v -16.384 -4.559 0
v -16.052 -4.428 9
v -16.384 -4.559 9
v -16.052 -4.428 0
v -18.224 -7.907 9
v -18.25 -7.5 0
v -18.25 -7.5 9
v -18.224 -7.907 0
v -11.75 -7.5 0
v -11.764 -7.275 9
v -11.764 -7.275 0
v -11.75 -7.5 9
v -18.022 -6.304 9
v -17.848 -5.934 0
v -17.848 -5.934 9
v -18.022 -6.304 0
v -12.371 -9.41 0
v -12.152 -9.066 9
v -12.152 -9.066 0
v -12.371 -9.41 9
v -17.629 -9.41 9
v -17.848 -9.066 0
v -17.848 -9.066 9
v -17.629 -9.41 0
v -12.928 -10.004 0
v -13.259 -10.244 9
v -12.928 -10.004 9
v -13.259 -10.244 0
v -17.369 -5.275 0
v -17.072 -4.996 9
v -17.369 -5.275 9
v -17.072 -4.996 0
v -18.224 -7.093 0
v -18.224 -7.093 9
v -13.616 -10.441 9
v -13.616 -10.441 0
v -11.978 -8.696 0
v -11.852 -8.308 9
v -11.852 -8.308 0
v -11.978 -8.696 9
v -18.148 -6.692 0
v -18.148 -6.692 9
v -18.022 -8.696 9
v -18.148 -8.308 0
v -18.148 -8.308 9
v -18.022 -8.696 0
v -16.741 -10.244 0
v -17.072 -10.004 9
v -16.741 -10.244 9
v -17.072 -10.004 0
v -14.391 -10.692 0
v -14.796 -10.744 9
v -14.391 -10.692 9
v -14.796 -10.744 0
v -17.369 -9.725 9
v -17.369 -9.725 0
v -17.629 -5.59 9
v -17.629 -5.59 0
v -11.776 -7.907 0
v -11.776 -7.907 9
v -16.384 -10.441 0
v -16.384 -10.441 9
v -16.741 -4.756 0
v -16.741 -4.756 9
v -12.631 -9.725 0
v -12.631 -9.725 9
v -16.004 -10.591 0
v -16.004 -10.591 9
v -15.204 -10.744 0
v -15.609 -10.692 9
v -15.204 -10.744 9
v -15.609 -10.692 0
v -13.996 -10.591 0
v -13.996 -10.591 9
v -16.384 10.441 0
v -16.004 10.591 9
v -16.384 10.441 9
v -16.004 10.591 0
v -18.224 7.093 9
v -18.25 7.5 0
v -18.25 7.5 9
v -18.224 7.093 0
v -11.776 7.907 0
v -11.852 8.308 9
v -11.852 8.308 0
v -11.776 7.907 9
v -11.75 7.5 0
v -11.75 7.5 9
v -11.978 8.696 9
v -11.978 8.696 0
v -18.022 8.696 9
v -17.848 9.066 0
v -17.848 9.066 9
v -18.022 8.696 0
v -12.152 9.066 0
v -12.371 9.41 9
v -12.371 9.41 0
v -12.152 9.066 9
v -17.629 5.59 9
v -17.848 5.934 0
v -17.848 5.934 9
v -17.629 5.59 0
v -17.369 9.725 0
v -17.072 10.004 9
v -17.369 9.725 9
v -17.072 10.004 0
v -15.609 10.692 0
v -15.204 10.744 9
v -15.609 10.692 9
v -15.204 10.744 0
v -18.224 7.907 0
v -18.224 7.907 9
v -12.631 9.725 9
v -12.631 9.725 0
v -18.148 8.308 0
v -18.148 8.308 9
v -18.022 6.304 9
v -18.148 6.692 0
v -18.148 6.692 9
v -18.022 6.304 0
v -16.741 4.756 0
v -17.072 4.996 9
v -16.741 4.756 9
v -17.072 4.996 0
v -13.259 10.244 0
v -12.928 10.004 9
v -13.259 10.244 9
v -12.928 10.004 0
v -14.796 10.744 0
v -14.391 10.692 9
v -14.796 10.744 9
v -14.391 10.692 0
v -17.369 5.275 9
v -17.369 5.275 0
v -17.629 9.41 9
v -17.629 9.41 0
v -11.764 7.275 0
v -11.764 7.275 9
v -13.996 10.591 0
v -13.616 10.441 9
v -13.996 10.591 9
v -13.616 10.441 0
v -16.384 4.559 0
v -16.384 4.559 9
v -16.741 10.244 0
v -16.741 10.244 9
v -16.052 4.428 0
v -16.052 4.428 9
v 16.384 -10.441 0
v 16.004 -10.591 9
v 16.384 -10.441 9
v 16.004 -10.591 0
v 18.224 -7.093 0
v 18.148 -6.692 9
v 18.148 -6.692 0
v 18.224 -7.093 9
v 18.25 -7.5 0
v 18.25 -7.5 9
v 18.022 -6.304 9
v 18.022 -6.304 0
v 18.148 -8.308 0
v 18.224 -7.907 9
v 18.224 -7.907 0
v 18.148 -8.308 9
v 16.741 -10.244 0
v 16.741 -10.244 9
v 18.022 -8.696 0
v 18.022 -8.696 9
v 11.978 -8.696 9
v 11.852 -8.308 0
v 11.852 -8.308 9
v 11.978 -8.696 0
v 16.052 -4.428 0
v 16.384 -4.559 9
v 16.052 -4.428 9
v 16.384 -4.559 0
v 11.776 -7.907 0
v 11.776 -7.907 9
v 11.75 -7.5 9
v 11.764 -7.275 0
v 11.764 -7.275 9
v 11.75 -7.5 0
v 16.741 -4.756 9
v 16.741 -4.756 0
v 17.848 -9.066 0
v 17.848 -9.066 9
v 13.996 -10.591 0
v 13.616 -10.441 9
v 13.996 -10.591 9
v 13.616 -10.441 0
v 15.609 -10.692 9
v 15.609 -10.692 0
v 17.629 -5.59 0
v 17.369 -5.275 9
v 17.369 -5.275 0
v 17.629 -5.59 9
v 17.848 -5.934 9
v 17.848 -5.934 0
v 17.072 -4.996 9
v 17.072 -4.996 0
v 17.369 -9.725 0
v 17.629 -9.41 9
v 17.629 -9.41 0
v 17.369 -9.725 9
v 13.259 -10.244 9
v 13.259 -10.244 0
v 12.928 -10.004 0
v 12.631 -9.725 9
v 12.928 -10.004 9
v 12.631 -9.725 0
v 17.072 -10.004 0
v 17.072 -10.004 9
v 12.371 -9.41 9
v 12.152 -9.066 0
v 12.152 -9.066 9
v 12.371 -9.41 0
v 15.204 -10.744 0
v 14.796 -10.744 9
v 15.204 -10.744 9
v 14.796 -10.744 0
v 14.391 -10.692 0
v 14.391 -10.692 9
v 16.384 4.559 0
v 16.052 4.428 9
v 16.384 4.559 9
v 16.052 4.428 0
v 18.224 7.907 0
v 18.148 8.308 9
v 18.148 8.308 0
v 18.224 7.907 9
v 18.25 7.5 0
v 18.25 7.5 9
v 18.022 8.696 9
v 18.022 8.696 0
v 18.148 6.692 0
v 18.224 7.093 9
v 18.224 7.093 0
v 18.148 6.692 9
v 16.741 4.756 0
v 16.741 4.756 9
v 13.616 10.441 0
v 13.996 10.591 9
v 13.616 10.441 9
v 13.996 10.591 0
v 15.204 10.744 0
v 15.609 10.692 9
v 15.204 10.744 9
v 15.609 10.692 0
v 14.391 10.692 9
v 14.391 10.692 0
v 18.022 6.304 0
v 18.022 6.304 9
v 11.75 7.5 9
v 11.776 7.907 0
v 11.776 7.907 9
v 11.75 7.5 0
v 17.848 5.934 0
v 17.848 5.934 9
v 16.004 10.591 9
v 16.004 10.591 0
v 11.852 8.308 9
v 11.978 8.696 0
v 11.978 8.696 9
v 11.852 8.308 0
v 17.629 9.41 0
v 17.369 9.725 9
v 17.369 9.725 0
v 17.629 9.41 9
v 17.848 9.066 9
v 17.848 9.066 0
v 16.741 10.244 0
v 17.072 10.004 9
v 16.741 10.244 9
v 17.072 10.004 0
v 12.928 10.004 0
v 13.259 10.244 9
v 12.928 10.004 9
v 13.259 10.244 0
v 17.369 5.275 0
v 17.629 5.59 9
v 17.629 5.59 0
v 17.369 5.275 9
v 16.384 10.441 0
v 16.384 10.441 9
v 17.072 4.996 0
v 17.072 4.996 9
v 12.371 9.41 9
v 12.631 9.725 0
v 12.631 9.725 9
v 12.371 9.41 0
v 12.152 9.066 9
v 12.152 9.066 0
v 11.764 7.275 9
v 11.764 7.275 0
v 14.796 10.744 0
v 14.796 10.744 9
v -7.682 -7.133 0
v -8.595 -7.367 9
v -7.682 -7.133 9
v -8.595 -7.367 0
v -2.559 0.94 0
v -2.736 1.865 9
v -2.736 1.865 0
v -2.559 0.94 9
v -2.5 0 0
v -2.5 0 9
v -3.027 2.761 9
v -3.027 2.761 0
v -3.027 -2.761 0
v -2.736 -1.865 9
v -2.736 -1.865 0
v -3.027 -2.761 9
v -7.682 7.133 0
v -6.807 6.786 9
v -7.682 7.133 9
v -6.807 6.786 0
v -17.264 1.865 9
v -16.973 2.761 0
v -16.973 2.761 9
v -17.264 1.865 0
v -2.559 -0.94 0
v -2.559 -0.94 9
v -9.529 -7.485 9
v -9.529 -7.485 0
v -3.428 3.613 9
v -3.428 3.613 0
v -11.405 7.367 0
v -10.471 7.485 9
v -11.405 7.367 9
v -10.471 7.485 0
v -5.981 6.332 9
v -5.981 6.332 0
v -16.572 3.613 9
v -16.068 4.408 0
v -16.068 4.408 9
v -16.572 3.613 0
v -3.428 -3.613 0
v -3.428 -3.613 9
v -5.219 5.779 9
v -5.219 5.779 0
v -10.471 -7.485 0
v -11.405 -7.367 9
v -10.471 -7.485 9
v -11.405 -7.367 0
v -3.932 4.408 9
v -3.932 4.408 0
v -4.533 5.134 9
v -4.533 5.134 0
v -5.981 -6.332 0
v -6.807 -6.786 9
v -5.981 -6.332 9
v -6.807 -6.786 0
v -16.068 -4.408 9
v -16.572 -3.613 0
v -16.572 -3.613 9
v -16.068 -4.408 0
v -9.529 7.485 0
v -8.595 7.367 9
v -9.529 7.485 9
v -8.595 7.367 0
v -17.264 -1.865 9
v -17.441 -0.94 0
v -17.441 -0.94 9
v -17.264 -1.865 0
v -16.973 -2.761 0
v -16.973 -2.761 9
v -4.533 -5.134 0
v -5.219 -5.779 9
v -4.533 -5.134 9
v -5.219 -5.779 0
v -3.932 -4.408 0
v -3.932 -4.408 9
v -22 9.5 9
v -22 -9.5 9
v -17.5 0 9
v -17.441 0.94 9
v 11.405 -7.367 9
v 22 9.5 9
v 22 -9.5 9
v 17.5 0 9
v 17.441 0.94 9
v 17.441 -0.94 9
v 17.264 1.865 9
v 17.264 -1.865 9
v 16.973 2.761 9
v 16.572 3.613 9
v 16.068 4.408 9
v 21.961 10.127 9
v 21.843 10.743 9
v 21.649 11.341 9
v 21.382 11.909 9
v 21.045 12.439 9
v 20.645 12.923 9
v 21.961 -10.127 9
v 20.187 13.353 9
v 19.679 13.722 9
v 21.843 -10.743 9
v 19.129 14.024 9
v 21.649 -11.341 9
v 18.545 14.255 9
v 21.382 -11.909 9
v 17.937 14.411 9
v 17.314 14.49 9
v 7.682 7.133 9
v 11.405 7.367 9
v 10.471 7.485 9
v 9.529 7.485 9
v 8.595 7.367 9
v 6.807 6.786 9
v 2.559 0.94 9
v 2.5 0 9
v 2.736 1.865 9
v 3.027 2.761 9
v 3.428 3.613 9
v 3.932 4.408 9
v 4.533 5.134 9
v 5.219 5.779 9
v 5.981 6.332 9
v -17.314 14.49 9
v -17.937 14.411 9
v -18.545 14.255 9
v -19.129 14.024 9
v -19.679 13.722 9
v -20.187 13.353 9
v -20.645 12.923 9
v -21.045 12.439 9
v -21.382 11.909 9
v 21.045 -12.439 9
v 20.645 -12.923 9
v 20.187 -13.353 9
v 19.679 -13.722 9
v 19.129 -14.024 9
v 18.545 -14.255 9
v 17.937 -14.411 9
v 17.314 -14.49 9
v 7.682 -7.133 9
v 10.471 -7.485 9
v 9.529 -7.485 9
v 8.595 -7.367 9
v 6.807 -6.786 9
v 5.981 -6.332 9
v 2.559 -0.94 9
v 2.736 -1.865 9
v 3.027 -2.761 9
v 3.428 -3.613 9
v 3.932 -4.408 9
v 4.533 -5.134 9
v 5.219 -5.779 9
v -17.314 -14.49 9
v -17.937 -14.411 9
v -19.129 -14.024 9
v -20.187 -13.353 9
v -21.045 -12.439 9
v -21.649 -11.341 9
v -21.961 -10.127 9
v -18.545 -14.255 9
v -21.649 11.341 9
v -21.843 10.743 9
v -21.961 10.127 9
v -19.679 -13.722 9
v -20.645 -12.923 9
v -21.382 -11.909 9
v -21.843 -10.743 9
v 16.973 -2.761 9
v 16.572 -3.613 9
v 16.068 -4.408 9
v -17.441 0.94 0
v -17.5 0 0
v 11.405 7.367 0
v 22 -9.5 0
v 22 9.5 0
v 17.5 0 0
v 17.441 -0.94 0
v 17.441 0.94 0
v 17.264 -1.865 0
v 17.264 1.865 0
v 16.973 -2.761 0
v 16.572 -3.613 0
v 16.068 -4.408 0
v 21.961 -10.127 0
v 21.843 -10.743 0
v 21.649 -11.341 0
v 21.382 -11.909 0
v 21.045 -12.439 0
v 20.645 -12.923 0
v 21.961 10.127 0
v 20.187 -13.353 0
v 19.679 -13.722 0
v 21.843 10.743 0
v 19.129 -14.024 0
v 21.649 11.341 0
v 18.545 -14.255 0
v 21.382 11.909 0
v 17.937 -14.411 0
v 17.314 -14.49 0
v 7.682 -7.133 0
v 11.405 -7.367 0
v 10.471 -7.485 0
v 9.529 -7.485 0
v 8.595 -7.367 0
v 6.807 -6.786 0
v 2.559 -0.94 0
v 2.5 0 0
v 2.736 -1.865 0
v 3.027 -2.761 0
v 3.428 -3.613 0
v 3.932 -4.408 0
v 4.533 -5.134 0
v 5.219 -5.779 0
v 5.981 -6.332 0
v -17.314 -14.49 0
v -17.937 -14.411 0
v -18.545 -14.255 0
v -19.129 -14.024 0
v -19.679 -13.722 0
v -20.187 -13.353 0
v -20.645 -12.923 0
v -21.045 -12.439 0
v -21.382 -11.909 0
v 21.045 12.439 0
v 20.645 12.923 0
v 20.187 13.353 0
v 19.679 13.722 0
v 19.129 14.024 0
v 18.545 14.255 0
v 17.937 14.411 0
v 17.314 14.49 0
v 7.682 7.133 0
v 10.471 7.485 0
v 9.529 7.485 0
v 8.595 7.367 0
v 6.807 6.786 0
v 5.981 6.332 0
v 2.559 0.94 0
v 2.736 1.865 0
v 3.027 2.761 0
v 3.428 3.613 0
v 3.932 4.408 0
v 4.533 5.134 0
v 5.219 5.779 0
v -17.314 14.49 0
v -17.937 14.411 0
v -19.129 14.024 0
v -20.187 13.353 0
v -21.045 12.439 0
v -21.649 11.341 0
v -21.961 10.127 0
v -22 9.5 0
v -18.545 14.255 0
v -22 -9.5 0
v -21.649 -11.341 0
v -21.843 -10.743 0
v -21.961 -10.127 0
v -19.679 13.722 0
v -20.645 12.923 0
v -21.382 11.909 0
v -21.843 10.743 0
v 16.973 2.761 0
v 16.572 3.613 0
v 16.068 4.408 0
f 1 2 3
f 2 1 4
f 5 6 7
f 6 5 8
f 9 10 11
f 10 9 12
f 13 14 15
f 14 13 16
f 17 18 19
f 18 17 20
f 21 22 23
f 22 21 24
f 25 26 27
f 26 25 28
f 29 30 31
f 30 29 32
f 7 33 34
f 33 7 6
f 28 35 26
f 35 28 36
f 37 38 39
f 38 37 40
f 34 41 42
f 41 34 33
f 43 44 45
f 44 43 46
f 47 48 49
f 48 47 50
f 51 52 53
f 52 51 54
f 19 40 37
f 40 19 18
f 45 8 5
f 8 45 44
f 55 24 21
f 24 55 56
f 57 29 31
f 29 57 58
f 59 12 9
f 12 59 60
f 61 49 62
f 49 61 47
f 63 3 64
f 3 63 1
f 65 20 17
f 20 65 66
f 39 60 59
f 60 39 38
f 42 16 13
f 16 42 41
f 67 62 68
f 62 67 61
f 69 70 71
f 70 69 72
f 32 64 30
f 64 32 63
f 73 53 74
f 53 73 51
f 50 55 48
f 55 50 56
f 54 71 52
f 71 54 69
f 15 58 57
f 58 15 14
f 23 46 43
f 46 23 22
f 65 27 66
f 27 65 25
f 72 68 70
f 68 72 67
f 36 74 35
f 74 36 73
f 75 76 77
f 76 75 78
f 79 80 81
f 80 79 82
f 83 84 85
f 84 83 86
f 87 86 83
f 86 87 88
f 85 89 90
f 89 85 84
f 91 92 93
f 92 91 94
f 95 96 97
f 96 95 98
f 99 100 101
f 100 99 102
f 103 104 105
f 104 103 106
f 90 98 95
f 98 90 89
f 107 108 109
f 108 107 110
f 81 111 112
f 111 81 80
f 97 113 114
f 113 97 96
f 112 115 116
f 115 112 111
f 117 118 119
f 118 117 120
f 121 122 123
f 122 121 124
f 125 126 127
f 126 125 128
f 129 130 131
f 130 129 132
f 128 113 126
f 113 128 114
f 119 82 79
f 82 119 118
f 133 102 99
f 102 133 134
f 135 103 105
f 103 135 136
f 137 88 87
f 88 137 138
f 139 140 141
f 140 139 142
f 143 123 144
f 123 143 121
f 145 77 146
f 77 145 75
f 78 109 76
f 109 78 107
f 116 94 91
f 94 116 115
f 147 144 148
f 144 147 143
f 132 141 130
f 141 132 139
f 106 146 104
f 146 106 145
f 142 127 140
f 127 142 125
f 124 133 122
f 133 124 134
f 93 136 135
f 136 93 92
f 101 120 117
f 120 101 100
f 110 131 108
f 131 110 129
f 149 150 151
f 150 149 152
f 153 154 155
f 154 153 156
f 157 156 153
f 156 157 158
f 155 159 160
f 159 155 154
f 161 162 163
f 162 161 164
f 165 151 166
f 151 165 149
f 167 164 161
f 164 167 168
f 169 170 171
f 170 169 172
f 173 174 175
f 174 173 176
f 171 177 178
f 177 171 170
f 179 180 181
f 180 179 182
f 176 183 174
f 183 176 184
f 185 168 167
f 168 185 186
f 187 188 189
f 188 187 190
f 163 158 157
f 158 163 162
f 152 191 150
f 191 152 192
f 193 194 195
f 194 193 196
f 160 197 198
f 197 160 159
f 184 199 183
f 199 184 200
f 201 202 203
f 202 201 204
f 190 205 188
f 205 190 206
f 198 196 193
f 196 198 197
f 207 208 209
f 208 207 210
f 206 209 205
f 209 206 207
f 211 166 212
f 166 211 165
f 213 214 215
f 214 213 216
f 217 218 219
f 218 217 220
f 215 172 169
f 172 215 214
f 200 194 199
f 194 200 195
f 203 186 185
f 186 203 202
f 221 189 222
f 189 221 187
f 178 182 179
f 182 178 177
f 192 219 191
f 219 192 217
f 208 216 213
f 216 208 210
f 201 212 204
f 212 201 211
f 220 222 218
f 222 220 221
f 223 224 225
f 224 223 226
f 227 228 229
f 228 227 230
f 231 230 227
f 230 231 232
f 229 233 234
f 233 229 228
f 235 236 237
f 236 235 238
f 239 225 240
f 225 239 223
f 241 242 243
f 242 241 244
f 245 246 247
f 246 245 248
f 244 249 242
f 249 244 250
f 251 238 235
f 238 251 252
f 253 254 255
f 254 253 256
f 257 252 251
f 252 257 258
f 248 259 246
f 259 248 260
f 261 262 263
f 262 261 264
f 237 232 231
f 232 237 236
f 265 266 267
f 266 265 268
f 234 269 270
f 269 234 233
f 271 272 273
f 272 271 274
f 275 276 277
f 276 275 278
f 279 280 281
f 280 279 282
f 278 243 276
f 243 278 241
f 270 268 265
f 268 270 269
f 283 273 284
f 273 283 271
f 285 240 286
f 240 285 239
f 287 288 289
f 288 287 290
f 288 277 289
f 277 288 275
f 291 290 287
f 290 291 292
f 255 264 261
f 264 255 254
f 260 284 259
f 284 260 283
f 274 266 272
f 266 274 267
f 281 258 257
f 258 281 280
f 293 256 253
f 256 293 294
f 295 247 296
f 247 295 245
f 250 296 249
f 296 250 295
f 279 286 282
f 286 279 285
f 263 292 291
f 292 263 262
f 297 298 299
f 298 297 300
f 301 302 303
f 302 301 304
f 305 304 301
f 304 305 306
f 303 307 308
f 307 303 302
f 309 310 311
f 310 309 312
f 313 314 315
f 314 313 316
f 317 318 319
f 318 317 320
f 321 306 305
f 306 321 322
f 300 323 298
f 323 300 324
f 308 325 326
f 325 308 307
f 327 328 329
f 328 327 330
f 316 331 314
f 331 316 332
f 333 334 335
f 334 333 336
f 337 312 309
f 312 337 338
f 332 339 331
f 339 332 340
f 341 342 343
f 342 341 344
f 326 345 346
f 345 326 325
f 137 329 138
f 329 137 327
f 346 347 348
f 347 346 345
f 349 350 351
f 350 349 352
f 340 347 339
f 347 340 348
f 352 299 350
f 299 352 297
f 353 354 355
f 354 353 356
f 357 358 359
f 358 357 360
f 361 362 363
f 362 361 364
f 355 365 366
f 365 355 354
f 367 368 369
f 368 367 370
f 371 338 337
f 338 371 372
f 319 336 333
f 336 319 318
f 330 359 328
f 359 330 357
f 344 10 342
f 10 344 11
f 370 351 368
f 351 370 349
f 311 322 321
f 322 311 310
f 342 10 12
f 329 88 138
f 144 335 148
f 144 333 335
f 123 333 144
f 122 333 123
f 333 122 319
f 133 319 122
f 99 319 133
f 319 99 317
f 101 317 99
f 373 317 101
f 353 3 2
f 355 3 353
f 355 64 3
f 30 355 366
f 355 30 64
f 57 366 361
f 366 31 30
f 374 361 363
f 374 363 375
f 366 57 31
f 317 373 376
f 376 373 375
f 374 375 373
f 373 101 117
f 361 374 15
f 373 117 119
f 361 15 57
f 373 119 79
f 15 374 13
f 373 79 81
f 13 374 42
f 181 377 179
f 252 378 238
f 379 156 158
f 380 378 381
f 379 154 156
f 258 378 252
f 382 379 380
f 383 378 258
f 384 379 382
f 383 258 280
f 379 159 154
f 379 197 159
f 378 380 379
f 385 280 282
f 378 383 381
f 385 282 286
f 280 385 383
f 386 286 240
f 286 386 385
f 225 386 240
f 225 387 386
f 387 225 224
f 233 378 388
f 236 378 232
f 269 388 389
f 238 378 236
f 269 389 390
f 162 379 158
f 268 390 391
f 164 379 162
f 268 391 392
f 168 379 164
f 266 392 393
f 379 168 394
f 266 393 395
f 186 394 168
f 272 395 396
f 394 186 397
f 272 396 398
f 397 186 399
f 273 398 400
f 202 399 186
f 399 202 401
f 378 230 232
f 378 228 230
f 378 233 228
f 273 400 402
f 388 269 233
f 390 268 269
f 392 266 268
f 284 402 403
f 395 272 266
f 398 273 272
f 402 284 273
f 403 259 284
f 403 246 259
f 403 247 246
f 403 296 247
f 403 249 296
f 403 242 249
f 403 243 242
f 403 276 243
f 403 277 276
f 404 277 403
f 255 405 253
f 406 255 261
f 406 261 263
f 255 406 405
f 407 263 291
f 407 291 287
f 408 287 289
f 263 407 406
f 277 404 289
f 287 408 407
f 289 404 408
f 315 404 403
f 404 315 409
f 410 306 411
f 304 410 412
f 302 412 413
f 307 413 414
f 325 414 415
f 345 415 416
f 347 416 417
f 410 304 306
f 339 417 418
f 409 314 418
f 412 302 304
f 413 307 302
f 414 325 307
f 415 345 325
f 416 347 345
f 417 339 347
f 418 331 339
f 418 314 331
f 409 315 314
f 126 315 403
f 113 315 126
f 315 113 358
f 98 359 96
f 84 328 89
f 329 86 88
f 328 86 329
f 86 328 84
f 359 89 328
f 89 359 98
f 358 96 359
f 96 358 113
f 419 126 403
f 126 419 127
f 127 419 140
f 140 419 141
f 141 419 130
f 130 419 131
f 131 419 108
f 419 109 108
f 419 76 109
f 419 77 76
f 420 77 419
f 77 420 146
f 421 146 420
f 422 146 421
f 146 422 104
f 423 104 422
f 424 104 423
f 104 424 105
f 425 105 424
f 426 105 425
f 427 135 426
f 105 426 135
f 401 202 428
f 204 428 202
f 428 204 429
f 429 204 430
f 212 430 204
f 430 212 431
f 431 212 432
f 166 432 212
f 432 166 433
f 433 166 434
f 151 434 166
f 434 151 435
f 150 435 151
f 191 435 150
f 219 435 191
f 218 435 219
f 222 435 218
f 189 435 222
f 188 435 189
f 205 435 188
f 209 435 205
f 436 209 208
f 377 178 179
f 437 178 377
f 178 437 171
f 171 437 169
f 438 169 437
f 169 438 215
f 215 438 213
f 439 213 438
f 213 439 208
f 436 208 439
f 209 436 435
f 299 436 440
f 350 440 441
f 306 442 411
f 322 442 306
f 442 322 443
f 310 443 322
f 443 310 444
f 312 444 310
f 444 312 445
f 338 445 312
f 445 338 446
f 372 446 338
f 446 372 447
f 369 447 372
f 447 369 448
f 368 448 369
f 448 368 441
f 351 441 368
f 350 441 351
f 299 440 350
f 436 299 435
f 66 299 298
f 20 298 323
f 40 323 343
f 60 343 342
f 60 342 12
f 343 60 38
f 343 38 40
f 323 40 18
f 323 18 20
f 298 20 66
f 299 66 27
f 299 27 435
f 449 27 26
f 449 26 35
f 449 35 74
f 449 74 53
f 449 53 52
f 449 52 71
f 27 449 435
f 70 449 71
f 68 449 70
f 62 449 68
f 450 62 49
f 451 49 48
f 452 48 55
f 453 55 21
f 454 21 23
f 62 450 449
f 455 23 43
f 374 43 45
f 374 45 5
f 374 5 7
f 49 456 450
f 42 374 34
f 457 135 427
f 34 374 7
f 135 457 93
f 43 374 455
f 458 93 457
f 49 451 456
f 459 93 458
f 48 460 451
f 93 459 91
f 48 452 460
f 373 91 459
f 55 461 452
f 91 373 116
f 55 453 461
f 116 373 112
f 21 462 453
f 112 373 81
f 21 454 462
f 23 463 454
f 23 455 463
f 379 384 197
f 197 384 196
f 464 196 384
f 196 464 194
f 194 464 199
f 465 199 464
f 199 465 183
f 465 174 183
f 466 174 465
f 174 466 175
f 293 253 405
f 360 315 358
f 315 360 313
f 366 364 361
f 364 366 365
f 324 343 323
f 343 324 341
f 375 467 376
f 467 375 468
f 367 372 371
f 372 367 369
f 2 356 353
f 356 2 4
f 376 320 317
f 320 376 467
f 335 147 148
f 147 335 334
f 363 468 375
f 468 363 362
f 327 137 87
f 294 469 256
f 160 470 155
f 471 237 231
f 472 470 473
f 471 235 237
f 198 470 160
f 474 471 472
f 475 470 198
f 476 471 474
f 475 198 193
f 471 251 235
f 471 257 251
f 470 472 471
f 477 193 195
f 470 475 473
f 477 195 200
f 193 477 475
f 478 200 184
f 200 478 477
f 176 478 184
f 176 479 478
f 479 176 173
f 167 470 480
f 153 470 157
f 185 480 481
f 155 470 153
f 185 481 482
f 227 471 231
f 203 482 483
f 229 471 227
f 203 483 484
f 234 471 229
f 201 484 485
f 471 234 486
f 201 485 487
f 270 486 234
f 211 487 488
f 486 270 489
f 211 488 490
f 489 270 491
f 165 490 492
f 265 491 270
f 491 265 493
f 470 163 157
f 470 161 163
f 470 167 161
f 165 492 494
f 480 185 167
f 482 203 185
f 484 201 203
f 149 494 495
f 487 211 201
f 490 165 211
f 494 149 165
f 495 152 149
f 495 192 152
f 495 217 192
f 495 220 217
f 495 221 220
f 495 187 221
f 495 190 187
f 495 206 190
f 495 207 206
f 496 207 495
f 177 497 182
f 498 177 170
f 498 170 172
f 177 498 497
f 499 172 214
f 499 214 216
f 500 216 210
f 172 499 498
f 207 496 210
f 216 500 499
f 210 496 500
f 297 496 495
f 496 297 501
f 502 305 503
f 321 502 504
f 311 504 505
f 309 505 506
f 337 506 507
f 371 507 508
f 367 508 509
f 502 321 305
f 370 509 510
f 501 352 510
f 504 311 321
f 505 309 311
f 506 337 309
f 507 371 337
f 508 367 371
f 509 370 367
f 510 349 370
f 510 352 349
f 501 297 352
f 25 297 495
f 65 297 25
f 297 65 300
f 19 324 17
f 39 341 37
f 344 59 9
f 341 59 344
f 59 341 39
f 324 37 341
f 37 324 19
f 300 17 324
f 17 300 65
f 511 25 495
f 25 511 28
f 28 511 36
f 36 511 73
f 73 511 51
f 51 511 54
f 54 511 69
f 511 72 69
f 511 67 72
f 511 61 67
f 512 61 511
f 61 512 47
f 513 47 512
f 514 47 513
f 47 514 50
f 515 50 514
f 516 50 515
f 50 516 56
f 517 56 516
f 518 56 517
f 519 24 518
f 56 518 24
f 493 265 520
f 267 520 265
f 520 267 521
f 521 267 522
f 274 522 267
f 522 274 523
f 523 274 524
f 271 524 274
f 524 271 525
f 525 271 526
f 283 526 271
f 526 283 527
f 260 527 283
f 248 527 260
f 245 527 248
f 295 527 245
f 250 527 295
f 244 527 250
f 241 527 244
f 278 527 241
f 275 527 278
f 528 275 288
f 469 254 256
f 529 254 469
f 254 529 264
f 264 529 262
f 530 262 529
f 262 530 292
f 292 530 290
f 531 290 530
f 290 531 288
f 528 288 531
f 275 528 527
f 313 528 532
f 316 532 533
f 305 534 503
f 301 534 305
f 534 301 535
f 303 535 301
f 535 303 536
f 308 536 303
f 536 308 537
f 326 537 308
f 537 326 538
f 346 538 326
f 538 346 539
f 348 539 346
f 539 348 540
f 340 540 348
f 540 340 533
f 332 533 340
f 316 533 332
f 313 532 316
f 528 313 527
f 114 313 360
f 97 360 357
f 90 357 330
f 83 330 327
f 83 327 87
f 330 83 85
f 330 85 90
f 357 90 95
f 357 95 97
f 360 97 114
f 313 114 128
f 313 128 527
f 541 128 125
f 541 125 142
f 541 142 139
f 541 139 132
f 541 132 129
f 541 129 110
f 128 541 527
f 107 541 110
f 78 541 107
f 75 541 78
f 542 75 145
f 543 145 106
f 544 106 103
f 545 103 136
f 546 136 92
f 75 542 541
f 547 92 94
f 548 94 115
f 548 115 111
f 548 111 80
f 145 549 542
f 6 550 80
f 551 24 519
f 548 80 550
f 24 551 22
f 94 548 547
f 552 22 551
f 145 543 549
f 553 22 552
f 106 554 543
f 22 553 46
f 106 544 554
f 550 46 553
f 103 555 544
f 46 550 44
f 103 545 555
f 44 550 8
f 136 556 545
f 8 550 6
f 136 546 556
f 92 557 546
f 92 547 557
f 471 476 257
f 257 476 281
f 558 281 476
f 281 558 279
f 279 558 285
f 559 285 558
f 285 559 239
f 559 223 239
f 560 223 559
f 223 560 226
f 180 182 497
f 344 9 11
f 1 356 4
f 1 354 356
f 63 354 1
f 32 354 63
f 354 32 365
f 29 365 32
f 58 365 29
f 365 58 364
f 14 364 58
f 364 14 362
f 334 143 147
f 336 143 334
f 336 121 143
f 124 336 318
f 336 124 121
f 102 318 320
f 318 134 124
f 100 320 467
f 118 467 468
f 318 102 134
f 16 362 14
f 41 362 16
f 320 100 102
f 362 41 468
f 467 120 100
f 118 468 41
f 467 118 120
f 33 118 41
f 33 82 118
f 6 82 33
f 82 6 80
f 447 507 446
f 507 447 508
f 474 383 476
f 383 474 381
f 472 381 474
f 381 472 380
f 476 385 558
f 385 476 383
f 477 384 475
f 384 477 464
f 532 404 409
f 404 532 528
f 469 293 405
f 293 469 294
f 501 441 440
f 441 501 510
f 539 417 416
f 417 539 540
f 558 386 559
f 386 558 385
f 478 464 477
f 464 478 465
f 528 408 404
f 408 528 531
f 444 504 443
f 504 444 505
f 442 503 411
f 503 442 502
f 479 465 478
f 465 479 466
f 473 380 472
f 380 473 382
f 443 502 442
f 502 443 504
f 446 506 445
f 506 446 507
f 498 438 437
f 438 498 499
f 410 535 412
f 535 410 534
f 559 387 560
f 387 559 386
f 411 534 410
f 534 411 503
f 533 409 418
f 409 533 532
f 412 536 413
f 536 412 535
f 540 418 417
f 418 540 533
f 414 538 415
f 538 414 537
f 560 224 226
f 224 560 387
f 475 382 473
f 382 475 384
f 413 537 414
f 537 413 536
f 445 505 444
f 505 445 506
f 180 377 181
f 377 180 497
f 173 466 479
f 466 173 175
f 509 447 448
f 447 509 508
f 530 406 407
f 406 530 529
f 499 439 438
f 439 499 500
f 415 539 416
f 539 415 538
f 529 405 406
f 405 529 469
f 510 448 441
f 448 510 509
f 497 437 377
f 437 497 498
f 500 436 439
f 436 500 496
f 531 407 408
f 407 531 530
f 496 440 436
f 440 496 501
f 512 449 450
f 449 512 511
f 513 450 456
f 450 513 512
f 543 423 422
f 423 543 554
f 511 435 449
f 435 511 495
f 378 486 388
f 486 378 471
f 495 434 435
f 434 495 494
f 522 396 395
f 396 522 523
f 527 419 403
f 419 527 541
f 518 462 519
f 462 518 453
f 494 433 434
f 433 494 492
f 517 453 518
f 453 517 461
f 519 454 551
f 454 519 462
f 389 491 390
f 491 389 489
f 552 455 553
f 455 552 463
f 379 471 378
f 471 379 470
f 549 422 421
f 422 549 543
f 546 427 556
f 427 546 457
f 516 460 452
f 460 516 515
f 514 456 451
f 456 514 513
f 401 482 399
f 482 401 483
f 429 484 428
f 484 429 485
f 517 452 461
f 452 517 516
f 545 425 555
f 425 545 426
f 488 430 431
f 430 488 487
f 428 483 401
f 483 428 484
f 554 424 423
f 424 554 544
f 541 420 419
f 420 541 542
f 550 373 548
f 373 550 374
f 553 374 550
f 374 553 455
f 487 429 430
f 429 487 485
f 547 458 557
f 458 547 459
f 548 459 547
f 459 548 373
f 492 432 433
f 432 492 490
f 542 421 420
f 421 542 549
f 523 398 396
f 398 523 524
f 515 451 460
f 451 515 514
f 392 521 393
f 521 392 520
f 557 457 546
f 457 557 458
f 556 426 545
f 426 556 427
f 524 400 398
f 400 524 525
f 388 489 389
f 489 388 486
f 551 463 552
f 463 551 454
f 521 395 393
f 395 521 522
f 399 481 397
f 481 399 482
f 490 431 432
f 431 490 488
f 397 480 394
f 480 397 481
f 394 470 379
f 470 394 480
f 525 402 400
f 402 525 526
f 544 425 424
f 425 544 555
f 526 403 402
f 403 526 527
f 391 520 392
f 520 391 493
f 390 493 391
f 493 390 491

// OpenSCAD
$fn = 50;


difference() {
	union() {
		hull() {
			translate(v = [-17.0000000000, 9.5000000000, 0]) {
				cylinder(h = 9, r = 5);
			}
			translate(v = [17.0000000000, 9.5000000000, 0]) {
				cylinder(h = 9, r = 5);
			}
			translate(v = [-17.0000000000, -9.5000000000, 0]) {
				cylinder(h = 9, r = 5);
			}
			translate(v = [17.0000000000, -9.5000000000, 0]) {
				cylinder(h = 9, r = 5);
			}
		}
	}
	union() {
		#translate(v = [-15.0000000000, -7.5000000000, -100.0000000000]) {
			cylinder(h = 200, r = 3.2500000000);
		}
		#translate(v = [-15.0000000000, 7.5000000000, -100.0000000000]) {
			cylinder(h = 200, r = 3.2500000000);
		}
		#translate(v = [15.0000000000, -7.5000000000, -100.0000000000]) {
			cylinder(h = 200, r = 3.2500000000);
		}
		#translate(v = [15.0000000000, 7.5000000000, -100.0000000000]) {
			cylinder(h = 200, r = 3.2500000000);
		}
		#translate(v = [-10.0000000000, 0, 0]) {
			cylinder(h = 9, r = 7.5000000000);
		}
		#translate(v = [10.0000000000, 0, 0]) {
			cylinder(h = 9, r = 7.5000000000);
		}
	}
}
